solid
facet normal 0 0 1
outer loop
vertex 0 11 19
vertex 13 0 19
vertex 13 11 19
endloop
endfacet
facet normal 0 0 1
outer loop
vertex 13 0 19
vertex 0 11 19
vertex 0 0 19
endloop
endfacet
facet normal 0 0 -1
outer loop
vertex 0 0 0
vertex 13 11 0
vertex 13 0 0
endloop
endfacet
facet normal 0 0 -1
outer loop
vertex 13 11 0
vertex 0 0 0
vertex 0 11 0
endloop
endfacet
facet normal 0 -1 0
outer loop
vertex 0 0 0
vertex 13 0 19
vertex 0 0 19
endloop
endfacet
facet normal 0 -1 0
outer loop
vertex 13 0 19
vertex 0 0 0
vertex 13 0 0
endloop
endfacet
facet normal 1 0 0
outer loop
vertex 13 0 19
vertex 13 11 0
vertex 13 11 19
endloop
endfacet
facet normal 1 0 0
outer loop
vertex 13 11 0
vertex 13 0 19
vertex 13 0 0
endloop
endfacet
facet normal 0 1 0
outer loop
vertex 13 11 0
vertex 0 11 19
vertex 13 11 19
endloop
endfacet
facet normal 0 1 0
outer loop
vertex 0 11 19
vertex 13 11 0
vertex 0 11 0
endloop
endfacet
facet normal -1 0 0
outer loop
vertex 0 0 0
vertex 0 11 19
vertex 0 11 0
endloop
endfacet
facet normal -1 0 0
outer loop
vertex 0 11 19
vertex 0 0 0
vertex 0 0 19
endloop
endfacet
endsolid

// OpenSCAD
// Generated by SolidPython 1.0.1 on 2020-07-29 00:46:55


cube(size = [13, 11, 19]);
/***********************************************
*********      SolidPython code:      **********
************************************************
 
# import packages: SolidPython
from solid import *
from solid.utils import *
from itertools import chain, combinations, permutations


class Resize:

    def __init__(self, scad_file):
        self.scad_file = scad_file
        #self.scad_file = import_scad(scad_file)
        # cone/cylinder param:
        self.r1 = 0
        self.r2 = 0
        self.h = 0
        # rectangular prism param:
        self.w = 0
        self.l = 0
        # ellipse param:
        self.r = 0

    # import OpenScad code (file name corresponds to shape)


    # classify shape + parameters
    def assign(self, param1, param2, param3):
        if self.scad_file == 'cone.scad':
            self.r1 = param1
            self.r2 = param2
            self.h = param3
        elif self.scad_file == 'cylinder.scad':
            self.r1 = param1
            self.r2 = param2
            self.h = param3
        elif self.scad_file == 'rectangularPrism.scad':
            self.h = param1
            self.l = param2
            self.w = param3
        else:
            self.r = param1
            self.h = param2

    # resize parameters
    def iterate(self):
        x = range(3, 20, 2)
        i = 1
        if self.scad_file == 'cone.scad':
            tempList = list(permutations(x, 2))
            for temp in tempList:
                param1 = temp[0]
                param2 = temp[1]
                filepath = 'produced_scad_files/' + 'cone' + str(param1) + '_' + str(param2) + '_' + '.scad'
                scad_render_to_file(cylinder(h=param1, r1=param2, r2=0), filepath)

        elif self.scad_file == 'cylinder.scad':
            tempList = list(permutations(x, 3))
            for temp in tempList:
                param1 = temp[0]
                param2 = temp[1]
                filepath = 'produced_scad_files/' + 'cylinder' + str(param1) + '_' + str(param2) + '_' + '.scad'
                scad_render_to_file(cylinder(h=param1, r1=param2, r2=param2), filepath)

        elif self.scad_file == 'rectangularPrism.scad':
            tempList = list(permutations(x, 3))
            for temp in tempList:
                param1 = temp[0]
                param2 = temp[1]
                param3 = temp[2]
                filepath = 'produced_scad_files/' + 'rectangularPrism' + str(param1) + '_' + str(param2) + '_' + str(
                    param3) + '.scad'
                scad_render_to_file(cube(size=(param1, param2, param3)), filepath)

        elif self.scad_file == 'ellipse.scad':
            tempList = list(permutations(x, 4))
            for temp in tempList:
                param1 = temp[0]
                param2 = temp[1]
                param3 = temp[2]
                param4 = temp[3]
                filepath = 'produced_scad_files/' + 'ellipse' + str(param1) + '_' + str(param2) + '_' + str(param3) + '_' + str(param4) + '.scad'
                scad_render_to_file(scale([param1, param2, param3])(sphere(r=param4)), filepath)

    def render_to_scadfile(self):
        scad_render_to_file(scad, 'example.scad') 
 
************************************************/
